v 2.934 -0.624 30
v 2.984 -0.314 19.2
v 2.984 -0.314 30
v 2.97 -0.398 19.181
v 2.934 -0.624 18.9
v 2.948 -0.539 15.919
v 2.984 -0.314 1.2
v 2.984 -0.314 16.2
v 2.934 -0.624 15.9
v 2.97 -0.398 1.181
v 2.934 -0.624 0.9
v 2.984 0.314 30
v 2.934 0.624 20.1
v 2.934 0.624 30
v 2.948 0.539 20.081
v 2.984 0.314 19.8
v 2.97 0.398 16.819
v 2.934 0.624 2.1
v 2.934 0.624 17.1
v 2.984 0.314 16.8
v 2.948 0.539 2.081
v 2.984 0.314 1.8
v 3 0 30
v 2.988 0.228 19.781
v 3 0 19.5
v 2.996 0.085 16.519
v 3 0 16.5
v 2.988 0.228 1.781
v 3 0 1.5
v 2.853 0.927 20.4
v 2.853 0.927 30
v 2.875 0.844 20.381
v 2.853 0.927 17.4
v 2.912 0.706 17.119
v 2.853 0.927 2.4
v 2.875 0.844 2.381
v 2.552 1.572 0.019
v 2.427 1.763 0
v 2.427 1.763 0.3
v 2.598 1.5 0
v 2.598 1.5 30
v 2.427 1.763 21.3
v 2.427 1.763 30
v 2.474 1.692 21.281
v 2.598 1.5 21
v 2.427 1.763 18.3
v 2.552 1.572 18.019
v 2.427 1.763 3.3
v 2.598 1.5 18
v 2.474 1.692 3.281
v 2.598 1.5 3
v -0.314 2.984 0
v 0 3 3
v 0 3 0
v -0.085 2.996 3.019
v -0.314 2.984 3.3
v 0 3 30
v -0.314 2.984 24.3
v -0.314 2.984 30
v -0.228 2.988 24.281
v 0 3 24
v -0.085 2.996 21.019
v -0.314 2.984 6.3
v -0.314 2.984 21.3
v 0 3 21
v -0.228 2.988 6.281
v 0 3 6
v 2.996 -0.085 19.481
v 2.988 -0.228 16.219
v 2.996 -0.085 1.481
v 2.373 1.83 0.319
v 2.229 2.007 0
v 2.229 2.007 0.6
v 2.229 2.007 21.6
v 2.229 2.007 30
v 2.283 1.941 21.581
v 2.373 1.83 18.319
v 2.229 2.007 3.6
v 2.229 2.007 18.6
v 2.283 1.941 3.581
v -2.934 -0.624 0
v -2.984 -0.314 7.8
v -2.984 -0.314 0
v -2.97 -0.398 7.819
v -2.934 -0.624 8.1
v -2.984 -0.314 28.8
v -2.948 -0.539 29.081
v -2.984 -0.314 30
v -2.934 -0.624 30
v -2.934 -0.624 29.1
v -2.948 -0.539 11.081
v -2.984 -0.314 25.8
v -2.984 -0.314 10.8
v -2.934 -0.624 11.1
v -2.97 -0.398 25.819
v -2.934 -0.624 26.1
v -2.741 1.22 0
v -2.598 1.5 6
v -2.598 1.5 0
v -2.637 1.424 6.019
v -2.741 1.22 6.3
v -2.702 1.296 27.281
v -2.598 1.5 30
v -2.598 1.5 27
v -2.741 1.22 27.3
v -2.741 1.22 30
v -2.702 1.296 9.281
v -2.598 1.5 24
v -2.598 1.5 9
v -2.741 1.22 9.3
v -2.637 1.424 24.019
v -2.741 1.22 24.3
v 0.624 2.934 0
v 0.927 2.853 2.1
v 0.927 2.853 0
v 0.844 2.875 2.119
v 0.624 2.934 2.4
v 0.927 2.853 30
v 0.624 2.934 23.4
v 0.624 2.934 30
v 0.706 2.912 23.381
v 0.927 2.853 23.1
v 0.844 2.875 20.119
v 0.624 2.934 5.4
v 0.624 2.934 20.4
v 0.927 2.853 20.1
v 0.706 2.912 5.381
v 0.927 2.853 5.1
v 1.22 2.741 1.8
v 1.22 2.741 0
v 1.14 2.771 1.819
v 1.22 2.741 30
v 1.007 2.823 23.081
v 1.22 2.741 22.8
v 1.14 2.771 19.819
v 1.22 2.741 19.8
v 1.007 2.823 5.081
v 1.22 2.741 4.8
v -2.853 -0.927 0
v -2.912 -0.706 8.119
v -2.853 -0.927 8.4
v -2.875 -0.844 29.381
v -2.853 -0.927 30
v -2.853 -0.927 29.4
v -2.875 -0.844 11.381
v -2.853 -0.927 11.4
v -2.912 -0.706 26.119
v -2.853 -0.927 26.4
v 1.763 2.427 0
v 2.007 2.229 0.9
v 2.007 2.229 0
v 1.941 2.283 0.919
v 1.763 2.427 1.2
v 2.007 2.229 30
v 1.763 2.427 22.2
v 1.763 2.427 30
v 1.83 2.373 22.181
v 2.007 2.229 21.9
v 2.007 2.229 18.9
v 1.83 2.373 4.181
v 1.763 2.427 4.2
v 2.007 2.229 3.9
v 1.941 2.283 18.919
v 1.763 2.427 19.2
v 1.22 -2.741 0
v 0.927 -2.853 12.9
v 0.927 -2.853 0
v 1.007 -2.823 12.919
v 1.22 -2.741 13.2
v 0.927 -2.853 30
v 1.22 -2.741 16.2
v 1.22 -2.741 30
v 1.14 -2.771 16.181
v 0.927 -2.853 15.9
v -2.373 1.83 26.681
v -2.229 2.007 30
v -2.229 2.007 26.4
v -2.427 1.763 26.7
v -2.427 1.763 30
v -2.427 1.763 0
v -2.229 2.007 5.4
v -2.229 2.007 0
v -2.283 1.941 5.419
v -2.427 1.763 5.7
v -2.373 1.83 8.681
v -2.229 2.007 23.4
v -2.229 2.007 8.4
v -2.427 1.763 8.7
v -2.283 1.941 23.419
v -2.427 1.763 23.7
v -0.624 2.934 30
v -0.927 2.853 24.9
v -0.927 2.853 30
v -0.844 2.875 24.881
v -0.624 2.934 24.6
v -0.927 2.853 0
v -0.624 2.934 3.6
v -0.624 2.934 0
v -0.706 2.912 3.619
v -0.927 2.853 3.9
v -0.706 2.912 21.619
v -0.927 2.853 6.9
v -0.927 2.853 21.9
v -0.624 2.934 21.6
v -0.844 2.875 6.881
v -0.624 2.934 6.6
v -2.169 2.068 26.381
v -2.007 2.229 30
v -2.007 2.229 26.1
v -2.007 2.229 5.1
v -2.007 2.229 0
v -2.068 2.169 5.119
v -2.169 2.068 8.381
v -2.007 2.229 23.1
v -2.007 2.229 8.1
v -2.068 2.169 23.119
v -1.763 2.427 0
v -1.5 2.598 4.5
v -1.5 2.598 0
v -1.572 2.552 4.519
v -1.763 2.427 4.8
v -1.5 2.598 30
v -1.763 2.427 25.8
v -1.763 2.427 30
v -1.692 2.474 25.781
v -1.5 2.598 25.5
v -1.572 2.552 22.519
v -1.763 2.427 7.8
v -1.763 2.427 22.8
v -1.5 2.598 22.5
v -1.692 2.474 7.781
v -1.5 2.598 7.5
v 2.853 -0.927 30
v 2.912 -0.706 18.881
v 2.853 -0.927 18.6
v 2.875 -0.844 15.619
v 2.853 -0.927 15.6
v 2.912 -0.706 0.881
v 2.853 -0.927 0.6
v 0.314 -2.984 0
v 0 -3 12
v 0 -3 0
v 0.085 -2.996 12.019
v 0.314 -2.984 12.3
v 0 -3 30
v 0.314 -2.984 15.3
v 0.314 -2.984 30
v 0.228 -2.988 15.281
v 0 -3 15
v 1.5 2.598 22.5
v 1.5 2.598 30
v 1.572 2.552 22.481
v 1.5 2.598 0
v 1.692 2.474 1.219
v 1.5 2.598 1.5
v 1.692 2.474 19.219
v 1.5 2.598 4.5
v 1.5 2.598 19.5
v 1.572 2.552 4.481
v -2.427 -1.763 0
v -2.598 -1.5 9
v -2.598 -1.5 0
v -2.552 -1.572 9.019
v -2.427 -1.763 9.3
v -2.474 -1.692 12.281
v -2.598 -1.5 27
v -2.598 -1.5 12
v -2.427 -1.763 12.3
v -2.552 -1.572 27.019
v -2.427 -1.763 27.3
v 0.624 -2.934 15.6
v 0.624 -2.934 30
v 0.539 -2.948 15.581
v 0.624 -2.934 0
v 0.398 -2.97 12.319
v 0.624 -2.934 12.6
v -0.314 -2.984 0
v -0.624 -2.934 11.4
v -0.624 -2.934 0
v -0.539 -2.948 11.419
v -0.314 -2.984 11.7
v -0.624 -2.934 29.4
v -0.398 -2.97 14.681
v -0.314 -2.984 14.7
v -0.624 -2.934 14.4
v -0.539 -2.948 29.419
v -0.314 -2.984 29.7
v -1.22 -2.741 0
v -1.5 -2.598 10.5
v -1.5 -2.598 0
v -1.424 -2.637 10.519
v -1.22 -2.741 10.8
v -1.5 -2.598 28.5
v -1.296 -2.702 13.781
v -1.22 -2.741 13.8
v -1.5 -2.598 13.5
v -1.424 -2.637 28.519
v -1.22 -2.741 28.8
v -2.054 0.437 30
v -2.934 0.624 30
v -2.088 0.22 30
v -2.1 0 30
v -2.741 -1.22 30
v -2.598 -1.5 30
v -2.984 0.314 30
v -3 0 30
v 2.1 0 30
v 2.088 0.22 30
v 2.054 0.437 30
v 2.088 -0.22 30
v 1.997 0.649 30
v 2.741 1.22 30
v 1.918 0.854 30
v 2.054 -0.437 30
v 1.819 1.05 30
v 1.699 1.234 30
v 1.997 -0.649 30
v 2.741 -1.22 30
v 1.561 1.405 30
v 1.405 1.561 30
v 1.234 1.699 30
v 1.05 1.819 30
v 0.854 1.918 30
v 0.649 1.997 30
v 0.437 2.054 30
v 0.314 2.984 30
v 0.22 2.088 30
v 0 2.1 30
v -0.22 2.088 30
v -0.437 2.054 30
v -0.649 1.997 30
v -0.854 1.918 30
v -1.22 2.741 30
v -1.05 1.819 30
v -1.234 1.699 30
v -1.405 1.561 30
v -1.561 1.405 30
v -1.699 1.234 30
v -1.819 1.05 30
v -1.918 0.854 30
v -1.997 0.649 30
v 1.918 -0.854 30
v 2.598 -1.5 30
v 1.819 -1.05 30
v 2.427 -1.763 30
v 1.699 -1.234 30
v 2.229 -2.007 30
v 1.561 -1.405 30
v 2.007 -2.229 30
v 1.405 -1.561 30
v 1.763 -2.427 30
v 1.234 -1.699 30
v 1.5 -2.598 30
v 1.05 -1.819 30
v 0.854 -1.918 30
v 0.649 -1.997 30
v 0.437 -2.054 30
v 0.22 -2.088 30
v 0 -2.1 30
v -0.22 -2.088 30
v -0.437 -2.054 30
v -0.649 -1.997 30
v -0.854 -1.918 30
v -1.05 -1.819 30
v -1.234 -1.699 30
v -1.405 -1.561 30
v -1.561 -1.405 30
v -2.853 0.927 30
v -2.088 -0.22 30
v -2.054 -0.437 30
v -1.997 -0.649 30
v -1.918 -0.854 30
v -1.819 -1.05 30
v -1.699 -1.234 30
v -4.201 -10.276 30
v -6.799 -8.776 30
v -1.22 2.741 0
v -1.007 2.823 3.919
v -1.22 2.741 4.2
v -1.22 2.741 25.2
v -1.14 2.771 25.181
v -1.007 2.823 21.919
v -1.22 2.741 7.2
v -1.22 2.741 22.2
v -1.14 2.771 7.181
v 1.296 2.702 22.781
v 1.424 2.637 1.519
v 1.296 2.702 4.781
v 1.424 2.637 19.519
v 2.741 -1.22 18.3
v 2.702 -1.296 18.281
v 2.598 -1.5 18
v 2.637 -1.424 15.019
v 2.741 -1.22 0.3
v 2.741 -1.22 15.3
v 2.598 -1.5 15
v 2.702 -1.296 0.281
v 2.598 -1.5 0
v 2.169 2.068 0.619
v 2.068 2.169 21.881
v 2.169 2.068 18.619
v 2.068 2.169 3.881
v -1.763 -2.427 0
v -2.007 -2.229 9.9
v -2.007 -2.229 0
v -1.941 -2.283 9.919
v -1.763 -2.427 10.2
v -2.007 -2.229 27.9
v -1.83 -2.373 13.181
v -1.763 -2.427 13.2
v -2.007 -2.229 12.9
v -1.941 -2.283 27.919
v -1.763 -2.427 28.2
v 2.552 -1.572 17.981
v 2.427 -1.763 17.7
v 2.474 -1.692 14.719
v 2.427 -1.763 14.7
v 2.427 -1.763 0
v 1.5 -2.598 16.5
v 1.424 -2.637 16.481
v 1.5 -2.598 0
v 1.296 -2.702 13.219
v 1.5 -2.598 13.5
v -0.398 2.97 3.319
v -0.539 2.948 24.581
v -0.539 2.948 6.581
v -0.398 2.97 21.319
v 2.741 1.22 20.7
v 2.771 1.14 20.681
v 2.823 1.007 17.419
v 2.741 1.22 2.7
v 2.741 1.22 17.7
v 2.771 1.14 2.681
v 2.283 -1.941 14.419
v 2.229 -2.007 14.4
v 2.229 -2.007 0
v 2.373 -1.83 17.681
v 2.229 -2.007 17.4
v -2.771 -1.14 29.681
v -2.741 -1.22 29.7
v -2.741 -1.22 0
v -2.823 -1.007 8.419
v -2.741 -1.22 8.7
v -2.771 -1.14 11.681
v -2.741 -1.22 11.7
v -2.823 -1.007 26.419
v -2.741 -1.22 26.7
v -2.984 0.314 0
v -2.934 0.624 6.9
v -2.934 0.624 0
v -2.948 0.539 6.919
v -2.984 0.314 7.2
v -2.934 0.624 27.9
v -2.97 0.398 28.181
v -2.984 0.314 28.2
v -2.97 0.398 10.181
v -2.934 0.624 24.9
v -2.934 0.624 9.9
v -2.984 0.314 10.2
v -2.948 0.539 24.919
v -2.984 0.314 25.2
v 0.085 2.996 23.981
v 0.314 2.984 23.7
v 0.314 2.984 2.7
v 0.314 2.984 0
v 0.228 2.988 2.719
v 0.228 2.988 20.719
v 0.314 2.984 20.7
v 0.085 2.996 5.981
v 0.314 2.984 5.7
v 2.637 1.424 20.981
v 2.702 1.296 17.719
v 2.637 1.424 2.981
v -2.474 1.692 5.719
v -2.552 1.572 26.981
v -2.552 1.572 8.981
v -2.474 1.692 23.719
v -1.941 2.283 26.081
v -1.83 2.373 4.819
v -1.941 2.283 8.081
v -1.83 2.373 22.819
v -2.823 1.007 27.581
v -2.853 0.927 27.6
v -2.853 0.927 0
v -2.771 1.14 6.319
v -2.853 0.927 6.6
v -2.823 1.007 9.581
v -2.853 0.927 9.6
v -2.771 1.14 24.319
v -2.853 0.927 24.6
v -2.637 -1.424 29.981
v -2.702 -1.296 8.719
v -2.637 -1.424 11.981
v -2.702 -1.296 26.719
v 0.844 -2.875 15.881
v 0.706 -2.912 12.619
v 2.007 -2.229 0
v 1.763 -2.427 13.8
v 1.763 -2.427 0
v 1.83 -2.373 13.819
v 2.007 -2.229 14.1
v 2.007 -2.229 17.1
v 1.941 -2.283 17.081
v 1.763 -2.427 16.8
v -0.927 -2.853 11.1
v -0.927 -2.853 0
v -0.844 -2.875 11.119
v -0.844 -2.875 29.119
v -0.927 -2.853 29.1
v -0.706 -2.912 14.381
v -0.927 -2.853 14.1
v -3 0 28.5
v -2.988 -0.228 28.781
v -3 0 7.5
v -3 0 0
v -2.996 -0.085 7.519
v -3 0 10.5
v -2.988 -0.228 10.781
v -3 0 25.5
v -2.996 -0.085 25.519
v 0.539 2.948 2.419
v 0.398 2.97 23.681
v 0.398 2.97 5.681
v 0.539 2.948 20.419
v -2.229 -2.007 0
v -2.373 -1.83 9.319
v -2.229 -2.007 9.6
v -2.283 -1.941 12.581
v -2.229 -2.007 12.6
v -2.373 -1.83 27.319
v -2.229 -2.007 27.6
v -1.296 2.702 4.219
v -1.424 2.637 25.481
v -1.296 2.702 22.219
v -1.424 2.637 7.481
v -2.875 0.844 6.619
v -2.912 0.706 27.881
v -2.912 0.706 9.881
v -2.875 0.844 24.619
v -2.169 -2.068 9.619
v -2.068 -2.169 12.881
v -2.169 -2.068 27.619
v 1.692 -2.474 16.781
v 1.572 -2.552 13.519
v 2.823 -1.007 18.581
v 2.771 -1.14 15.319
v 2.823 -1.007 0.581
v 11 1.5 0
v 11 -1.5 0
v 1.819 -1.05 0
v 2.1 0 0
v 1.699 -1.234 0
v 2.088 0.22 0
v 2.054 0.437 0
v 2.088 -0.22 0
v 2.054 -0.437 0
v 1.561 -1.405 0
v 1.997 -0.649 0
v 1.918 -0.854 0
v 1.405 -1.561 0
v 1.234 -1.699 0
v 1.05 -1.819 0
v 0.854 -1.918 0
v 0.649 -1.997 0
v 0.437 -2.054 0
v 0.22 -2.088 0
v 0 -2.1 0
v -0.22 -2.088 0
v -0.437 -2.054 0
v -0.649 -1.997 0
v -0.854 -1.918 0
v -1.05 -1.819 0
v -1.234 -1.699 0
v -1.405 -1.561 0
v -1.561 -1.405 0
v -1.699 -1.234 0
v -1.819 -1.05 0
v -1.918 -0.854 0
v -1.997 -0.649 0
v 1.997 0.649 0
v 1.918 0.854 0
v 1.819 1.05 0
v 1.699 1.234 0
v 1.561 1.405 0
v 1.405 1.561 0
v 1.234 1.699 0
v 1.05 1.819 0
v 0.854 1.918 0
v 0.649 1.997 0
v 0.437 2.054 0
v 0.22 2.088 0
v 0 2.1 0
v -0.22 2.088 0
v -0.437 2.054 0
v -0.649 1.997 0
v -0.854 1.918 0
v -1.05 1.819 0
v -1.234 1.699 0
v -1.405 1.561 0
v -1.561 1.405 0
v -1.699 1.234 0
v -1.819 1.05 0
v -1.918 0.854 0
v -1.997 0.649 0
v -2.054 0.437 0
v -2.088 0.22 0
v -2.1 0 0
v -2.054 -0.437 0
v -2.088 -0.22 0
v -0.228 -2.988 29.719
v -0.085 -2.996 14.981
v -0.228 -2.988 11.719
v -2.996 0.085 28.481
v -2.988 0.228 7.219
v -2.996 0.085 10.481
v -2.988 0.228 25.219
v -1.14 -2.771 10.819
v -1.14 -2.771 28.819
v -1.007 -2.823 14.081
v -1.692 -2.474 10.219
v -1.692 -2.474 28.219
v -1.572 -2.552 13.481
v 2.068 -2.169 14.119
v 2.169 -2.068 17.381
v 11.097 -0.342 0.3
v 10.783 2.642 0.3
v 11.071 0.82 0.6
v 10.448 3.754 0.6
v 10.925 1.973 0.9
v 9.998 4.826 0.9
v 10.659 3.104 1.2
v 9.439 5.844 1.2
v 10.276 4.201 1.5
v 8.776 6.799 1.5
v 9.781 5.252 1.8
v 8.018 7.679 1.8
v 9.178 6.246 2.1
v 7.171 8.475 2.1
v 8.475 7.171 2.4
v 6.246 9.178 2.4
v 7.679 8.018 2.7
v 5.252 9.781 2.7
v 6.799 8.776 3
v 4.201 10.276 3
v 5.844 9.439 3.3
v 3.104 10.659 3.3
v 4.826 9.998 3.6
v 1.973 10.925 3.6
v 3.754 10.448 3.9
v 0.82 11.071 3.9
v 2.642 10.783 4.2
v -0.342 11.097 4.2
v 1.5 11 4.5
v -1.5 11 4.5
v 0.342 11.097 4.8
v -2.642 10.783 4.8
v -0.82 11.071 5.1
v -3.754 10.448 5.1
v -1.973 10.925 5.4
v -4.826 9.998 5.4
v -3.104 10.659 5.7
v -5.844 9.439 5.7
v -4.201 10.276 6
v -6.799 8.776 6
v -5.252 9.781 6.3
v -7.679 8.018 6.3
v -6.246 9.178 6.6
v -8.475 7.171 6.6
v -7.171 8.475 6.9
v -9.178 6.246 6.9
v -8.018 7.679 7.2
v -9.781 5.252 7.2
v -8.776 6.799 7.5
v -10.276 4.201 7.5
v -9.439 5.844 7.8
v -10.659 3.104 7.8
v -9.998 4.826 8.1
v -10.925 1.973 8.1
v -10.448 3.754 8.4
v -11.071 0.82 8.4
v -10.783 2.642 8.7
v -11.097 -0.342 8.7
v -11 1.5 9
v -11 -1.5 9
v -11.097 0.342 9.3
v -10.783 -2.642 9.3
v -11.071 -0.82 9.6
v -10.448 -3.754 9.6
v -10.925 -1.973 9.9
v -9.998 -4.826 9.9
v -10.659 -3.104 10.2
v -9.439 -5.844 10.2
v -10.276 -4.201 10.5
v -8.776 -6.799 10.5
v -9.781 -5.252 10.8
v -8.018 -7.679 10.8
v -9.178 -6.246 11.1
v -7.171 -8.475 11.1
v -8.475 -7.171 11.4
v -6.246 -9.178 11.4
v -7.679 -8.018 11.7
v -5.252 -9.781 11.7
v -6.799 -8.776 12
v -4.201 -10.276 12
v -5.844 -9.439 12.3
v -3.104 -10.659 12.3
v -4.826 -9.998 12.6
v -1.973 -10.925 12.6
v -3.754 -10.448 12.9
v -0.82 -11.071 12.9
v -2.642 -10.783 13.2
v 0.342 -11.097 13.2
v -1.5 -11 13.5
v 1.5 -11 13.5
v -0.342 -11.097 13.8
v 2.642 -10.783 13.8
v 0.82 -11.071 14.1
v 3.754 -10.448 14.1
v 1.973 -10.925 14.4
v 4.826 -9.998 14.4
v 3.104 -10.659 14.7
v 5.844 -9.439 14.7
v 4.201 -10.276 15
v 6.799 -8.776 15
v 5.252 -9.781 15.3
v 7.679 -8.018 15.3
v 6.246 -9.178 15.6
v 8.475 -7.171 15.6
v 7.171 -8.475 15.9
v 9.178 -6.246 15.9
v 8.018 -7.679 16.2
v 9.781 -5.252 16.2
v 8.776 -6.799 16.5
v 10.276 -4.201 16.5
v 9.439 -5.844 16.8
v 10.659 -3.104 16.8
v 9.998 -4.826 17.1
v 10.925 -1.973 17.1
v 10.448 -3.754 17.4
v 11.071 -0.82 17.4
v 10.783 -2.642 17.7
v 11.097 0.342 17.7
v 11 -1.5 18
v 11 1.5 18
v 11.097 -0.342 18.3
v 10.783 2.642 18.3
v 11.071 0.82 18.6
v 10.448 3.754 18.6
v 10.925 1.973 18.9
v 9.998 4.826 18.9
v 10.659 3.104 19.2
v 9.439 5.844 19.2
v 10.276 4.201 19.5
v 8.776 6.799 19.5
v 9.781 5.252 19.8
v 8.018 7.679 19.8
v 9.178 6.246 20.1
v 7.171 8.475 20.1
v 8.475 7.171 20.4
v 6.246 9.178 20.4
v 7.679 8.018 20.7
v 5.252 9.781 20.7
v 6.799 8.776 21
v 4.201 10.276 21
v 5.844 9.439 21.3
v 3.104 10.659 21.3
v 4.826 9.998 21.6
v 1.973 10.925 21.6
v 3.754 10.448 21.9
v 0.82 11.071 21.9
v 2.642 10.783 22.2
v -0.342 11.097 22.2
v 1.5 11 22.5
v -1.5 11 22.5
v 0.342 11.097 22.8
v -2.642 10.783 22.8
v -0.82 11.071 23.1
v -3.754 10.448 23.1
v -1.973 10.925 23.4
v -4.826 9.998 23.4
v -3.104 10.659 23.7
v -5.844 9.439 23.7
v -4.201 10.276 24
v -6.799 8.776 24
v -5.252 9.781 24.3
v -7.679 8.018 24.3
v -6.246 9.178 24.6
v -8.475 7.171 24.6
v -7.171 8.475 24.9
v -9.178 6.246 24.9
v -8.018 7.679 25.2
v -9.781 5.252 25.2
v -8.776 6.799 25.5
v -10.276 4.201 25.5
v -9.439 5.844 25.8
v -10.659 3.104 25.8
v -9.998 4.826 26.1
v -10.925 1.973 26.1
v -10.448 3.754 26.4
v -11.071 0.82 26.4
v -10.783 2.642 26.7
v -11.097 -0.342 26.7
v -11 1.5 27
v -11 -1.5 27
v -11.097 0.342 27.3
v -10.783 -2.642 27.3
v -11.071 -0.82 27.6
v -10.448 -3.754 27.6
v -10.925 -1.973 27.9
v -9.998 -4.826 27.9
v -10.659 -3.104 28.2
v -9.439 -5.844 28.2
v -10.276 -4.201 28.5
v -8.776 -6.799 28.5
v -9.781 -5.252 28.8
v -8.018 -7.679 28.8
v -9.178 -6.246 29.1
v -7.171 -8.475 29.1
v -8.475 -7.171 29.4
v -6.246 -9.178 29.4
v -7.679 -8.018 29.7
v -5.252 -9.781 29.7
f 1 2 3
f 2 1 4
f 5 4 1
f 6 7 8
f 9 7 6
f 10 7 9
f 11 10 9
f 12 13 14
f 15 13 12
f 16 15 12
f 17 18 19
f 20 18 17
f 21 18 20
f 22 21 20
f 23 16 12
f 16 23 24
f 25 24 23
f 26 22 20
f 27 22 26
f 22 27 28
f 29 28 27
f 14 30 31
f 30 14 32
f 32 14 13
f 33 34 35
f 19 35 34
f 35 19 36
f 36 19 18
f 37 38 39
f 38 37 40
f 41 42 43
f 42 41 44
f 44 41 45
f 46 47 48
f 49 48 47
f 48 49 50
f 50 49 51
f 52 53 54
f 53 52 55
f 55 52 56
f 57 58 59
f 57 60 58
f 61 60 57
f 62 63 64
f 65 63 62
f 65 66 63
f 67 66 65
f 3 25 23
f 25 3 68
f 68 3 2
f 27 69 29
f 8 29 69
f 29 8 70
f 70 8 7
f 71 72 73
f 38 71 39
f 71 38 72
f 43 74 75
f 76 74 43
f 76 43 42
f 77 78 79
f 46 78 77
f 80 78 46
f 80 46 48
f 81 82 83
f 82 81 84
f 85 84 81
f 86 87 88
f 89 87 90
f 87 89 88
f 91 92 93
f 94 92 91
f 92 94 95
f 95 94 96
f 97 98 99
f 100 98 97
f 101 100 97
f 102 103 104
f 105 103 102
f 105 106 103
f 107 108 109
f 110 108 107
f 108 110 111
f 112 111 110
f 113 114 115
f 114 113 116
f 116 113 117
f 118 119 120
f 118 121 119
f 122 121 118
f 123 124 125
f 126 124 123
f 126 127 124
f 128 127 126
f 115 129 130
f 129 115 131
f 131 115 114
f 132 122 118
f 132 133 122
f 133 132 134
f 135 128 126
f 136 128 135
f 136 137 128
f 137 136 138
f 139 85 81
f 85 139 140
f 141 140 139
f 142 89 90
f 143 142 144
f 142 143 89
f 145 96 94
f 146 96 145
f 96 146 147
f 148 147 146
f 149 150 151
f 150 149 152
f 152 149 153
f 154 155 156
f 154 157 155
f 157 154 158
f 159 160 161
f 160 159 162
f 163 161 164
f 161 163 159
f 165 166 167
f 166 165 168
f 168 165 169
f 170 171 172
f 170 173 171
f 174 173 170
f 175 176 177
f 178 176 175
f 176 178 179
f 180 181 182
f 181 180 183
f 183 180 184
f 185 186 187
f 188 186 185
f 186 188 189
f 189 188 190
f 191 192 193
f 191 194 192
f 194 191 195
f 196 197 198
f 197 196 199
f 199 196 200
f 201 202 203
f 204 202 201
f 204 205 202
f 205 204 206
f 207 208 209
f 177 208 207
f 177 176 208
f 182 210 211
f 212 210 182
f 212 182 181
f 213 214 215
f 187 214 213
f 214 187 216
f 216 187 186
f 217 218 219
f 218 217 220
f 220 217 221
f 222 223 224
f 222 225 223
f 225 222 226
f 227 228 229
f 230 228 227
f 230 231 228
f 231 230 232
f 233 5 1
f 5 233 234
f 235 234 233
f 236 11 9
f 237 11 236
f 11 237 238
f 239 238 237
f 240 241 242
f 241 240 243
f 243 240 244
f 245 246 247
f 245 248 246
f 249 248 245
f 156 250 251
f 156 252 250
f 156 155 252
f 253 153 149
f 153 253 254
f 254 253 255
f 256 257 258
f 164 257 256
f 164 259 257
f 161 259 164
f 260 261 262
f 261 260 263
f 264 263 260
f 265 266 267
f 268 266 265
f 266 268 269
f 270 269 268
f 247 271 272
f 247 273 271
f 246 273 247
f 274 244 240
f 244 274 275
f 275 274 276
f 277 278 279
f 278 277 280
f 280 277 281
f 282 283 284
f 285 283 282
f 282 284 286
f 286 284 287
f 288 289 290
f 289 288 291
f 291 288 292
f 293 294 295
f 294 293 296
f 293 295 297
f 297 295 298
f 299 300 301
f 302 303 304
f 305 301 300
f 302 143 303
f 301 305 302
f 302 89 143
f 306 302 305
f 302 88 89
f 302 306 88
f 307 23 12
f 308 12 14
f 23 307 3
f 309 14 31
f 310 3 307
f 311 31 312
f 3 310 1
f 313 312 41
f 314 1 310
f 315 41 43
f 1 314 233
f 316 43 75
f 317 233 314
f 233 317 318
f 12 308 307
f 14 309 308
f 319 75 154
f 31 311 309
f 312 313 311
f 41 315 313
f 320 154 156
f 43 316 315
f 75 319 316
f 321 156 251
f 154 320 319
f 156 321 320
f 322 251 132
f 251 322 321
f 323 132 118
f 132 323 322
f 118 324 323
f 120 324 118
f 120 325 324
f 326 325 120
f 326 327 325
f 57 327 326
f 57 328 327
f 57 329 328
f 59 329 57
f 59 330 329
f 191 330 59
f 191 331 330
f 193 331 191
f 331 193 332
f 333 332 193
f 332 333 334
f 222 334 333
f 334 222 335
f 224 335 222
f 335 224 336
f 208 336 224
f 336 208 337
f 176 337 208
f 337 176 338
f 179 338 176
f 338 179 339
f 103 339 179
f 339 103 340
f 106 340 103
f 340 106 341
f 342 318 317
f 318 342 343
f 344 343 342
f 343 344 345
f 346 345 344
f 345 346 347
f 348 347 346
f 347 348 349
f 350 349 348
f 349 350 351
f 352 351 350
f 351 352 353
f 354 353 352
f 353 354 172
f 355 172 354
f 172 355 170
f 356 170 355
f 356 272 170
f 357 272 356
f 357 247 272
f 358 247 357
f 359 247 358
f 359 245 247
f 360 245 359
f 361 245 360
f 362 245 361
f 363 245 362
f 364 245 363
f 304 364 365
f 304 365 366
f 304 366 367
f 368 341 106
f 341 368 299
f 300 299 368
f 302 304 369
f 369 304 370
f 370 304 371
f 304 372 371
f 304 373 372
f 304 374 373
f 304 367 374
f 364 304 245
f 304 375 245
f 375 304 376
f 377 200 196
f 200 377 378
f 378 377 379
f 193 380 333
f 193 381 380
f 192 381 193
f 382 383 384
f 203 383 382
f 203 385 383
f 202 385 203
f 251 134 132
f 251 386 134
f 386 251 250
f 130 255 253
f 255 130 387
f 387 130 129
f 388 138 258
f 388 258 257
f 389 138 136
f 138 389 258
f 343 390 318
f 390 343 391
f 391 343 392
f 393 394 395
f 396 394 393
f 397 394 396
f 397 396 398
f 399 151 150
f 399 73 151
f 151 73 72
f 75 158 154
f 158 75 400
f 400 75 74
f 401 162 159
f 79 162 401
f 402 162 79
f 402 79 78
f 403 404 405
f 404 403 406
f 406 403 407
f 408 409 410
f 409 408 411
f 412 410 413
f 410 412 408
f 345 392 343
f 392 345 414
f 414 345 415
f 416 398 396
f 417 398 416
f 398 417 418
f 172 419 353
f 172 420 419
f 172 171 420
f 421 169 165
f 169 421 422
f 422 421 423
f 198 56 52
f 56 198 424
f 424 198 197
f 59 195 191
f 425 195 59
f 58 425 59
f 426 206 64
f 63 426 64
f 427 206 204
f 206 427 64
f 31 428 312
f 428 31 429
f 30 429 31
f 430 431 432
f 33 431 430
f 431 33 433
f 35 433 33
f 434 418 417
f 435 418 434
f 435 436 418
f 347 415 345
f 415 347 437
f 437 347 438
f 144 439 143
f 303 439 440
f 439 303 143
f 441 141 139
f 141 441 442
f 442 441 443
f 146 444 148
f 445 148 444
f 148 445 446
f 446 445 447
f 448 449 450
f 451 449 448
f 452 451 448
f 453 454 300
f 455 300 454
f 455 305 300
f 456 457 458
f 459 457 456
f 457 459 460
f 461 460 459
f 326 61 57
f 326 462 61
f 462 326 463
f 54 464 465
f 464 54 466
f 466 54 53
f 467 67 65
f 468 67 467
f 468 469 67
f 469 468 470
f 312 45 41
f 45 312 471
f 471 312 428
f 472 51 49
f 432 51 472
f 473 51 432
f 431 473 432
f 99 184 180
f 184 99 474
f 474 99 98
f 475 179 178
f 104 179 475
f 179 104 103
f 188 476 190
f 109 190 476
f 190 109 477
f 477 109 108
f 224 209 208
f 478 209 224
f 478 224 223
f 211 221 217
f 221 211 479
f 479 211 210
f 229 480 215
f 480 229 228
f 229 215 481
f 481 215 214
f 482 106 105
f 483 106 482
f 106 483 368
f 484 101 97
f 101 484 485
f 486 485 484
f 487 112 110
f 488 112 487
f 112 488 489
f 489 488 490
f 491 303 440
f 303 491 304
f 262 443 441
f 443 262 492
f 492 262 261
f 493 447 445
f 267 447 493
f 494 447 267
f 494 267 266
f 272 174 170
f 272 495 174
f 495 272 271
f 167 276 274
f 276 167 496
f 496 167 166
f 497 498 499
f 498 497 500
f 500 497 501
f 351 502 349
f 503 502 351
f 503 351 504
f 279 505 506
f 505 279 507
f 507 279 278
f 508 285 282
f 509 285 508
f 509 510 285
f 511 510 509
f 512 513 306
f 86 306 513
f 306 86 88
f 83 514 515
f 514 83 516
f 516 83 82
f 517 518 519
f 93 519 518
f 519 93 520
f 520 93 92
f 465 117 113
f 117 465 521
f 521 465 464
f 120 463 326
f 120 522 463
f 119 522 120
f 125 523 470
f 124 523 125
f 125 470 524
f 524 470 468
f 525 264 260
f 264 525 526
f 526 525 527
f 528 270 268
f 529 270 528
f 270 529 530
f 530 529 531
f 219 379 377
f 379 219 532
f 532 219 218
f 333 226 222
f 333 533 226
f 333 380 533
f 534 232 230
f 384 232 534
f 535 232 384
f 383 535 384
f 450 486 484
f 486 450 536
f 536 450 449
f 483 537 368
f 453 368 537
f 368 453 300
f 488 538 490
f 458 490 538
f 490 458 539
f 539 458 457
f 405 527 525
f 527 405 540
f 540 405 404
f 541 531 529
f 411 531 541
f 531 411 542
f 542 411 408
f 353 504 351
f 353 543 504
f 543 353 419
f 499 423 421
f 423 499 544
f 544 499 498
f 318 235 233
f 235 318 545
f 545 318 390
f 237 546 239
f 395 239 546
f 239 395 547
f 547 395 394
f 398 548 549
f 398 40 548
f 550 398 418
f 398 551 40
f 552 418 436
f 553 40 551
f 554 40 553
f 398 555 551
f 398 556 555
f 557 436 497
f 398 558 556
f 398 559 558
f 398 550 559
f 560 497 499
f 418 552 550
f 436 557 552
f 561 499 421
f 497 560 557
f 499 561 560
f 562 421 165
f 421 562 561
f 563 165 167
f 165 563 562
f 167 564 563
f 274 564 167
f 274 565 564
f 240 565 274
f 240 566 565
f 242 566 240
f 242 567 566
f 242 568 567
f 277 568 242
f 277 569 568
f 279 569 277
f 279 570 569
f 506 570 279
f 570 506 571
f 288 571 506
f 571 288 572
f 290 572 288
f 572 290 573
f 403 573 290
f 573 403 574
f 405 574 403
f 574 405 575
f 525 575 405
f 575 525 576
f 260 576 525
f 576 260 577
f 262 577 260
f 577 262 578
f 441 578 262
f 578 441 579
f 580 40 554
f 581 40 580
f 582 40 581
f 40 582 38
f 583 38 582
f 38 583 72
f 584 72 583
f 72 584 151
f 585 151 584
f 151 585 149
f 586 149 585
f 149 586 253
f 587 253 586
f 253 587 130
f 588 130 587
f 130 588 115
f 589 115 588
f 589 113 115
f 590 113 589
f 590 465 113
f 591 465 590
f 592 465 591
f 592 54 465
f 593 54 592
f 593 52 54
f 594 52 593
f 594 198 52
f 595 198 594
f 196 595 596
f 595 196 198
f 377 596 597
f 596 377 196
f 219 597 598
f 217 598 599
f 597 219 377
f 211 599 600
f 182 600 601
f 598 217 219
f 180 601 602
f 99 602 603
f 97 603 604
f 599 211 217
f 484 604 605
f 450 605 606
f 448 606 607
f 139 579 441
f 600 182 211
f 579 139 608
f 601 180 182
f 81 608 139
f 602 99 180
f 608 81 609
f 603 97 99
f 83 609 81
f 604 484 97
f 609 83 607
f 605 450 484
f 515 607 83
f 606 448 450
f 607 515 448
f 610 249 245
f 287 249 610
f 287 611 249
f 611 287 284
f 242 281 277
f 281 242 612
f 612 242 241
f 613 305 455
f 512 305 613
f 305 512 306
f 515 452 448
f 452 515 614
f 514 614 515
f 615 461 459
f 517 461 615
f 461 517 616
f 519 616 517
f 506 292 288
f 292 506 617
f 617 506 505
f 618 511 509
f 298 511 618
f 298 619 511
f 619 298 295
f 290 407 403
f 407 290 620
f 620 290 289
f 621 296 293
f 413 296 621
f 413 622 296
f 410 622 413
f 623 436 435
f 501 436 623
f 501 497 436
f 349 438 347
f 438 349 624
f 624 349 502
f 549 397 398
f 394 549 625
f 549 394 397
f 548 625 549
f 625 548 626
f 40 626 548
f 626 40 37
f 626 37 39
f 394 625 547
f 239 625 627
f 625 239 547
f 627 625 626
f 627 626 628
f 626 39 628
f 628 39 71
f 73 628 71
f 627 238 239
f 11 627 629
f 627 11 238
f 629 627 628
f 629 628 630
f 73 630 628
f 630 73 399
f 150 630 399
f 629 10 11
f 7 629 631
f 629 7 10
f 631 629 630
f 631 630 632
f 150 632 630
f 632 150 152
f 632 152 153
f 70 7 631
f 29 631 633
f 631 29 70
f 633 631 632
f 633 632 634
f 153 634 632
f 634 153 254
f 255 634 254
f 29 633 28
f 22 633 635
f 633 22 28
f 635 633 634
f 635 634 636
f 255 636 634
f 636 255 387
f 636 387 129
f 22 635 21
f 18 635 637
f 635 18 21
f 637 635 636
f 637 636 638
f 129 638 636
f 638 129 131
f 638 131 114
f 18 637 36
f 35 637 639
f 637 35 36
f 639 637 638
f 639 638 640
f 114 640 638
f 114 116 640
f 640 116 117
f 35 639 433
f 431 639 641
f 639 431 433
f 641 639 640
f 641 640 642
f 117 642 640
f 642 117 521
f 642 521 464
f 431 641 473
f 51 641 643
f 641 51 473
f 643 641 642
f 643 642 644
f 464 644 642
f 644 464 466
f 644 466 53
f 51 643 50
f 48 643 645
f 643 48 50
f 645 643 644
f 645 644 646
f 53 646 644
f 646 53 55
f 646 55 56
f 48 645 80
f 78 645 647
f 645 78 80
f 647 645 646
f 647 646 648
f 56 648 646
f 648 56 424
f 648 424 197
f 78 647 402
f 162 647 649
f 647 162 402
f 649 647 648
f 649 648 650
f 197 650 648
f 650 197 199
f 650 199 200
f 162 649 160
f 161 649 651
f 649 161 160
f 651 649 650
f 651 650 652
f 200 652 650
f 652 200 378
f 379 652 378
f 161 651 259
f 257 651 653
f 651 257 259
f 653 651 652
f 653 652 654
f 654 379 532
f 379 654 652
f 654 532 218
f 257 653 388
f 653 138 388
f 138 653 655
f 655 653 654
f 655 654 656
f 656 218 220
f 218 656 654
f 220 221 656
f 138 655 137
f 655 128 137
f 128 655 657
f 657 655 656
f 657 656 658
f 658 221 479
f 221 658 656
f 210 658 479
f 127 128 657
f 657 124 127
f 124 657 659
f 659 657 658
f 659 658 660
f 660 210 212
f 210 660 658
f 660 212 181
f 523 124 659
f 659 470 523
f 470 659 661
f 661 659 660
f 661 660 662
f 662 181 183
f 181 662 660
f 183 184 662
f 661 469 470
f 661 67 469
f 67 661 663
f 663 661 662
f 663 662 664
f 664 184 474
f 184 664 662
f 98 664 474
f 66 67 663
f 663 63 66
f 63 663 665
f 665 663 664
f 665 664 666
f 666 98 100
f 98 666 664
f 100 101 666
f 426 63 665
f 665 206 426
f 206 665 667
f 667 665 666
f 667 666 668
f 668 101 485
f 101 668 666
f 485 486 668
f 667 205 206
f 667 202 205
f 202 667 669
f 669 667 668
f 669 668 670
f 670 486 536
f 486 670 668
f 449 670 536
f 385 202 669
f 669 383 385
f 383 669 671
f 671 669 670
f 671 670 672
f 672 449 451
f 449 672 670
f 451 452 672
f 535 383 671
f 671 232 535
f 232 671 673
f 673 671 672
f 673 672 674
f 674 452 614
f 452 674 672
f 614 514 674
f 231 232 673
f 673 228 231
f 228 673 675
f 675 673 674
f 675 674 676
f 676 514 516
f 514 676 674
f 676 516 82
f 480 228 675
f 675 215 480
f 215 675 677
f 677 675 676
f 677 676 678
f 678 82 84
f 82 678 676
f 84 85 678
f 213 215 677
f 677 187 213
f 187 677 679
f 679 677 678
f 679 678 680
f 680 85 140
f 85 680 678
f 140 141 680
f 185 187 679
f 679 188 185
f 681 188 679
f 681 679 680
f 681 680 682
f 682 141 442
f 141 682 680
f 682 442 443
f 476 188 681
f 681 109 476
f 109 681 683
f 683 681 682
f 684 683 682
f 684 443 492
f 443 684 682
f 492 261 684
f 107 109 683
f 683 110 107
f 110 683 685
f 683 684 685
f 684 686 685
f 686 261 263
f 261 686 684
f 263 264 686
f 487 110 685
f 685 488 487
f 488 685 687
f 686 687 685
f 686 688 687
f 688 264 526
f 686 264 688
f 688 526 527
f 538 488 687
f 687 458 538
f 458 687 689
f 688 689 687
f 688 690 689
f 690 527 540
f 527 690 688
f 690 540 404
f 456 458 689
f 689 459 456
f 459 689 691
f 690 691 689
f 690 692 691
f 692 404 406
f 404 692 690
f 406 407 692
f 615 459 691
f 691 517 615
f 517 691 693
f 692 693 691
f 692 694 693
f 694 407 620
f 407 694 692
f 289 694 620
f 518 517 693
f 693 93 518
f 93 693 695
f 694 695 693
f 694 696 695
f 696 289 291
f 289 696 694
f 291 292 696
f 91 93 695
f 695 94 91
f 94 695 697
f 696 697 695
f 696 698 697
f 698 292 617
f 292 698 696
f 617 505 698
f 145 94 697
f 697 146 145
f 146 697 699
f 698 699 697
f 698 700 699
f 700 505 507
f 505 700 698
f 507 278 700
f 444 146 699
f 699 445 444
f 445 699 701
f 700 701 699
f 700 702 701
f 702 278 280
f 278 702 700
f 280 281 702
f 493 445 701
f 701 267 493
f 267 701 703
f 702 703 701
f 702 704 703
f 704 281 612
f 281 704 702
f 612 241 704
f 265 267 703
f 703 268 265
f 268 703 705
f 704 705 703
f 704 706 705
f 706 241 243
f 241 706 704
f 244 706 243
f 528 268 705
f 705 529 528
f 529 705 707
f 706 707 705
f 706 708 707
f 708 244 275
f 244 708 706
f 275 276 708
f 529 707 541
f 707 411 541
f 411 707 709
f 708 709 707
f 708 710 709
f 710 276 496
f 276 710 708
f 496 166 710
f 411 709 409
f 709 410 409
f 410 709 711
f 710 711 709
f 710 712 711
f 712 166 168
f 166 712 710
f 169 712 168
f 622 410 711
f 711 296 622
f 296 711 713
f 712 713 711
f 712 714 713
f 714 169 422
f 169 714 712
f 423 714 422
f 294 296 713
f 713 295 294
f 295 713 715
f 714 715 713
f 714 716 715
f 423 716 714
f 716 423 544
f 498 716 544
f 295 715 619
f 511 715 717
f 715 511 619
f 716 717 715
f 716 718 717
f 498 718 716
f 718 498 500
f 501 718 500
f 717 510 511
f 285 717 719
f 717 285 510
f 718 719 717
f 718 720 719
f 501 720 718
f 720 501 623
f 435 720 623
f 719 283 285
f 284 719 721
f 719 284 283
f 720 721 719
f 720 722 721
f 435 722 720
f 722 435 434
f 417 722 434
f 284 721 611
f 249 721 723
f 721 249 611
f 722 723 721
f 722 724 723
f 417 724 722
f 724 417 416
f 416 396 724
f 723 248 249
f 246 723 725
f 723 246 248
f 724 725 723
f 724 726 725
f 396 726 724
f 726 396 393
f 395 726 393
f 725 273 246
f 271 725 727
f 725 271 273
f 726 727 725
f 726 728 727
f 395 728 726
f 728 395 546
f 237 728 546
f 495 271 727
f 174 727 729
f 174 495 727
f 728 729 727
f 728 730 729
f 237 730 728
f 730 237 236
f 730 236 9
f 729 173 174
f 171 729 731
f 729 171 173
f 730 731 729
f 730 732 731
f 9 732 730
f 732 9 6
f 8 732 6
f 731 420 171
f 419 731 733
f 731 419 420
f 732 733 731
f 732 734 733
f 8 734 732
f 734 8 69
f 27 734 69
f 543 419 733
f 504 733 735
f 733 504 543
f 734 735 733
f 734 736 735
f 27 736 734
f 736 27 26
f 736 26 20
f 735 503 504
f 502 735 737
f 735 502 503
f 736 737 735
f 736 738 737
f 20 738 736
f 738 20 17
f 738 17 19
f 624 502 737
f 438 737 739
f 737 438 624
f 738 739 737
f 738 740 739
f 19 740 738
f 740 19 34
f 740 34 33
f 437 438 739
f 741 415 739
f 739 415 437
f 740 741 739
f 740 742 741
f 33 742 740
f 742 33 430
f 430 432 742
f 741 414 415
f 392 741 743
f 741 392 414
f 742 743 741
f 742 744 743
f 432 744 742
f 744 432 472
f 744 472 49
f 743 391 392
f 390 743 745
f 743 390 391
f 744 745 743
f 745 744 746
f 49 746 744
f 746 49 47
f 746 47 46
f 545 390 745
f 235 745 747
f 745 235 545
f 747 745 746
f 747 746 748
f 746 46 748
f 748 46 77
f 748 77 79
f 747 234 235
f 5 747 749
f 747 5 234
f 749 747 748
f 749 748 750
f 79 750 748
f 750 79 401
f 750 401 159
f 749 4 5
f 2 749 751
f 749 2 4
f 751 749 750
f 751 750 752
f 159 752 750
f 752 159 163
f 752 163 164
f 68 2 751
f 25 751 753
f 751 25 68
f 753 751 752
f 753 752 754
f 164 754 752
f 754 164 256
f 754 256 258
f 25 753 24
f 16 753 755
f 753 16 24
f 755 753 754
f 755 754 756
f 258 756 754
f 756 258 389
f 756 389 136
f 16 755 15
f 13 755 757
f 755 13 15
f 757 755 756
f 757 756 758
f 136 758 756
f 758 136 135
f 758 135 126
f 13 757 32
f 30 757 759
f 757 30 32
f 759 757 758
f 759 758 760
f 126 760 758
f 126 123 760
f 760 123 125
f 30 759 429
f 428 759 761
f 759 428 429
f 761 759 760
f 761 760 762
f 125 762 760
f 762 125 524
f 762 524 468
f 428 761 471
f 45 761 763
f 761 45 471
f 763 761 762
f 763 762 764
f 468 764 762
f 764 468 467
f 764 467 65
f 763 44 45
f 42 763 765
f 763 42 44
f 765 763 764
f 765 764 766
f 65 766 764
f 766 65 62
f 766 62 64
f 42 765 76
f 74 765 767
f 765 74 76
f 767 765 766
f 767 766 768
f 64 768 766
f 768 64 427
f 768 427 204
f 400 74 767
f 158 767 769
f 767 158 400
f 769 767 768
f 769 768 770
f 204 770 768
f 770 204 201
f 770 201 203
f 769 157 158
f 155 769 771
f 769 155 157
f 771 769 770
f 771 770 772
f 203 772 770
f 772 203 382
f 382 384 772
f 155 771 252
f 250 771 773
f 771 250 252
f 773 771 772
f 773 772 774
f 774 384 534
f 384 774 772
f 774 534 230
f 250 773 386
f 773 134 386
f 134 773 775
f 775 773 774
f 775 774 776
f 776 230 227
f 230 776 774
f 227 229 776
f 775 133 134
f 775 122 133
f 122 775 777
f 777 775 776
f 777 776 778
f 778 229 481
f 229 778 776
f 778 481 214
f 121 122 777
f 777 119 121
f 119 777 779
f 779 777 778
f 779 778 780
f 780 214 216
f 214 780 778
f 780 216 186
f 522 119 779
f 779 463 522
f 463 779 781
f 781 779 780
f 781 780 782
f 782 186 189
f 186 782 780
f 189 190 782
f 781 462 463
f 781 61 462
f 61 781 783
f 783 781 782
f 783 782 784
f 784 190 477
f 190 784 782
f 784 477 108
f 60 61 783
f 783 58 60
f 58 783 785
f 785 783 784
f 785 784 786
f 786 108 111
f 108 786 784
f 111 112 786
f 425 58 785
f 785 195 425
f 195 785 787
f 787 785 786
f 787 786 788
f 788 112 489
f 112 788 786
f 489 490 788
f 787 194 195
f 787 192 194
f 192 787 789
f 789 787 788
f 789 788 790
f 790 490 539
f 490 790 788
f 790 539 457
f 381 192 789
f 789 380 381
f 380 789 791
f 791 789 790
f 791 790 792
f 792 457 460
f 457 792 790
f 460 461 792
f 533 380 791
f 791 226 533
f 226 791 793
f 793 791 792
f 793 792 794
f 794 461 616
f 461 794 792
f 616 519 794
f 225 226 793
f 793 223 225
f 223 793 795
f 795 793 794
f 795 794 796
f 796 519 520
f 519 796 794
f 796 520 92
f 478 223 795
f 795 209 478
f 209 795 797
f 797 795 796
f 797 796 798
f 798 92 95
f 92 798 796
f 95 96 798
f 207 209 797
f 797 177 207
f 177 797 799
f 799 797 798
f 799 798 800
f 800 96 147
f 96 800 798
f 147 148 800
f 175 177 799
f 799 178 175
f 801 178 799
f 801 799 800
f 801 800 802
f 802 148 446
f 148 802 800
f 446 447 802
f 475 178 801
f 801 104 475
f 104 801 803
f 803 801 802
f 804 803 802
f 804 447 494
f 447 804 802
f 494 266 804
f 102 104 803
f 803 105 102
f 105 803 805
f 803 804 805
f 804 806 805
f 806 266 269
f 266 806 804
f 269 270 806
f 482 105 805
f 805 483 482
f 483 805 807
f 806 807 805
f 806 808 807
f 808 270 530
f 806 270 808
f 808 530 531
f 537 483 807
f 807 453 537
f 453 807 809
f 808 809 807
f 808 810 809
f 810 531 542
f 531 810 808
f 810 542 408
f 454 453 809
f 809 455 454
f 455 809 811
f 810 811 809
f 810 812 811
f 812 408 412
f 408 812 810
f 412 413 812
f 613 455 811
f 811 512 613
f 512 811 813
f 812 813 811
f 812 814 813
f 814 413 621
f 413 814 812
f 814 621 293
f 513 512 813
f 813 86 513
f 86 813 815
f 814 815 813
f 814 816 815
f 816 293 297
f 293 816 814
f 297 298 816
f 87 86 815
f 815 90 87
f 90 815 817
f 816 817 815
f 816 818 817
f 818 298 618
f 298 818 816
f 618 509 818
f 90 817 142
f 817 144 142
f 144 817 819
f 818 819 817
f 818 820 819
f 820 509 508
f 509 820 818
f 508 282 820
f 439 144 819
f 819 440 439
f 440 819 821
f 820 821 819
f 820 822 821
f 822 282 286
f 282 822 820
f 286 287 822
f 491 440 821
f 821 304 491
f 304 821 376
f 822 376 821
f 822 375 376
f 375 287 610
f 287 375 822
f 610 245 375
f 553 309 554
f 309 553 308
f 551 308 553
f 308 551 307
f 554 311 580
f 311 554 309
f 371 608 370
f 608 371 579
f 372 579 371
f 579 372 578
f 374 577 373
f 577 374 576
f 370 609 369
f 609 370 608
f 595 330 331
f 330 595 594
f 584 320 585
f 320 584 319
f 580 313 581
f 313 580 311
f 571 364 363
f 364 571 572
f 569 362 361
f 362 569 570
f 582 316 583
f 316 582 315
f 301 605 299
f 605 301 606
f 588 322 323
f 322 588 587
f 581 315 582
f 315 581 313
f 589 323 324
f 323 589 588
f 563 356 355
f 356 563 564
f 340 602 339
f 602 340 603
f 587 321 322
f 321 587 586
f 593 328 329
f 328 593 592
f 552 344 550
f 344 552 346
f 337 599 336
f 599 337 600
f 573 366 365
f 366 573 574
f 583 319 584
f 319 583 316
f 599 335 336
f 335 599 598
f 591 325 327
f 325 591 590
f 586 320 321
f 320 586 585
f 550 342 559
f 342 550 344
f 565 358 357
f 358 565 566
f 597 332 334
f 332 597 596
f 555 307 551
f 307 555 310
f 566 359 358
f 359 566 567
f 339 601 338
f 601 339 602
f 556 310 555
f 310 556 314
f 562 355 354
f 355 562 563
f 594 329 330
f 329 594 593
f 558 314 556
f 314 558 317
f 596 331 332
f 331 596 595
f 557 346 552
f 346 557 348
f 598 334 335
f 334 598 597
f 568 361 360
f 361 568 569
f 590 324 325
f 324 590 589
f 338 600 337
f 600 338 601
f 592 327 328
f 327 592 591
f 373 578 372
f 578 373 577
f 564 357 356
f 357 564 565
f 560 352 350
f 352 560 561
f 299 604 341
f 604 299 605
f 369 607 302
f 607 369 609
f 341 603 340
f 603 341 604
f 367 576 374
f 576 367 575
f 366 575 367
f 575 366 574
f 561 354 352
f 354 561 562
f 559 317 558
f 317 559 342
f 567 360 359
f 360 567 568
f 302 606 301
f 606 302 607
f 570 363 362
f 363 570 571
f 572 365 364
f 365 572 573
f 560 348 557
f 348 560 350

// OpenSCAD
ball_diameter = 9.5;
shaft_diameter = 6;
joint_diameter = 4.2;
clearance = 1;
ball_padding = 0.5;
wing_length = ball_diameter - clearance - ball_padding;
outer_diameter = shaft_diameter + wing_length * 2;
screw_height = 30;
screw_pitch = 18;

$fn = 60;

difference() {
    union() {
        cylinder(d = shaft_diameter, h = screw_height);
        linear_extrude(height = screw_height, twist = -360 * (screw_height / screw_pitch), convexity = 10)
            translate([shaft_diameter / 2 - 1, -1.5, 0])
            square([wing_length + 1, 3]);
    }

    translate([0, 0, -1])
    cylinder(d = joint_diameter, h = screw_height + 2);
}
